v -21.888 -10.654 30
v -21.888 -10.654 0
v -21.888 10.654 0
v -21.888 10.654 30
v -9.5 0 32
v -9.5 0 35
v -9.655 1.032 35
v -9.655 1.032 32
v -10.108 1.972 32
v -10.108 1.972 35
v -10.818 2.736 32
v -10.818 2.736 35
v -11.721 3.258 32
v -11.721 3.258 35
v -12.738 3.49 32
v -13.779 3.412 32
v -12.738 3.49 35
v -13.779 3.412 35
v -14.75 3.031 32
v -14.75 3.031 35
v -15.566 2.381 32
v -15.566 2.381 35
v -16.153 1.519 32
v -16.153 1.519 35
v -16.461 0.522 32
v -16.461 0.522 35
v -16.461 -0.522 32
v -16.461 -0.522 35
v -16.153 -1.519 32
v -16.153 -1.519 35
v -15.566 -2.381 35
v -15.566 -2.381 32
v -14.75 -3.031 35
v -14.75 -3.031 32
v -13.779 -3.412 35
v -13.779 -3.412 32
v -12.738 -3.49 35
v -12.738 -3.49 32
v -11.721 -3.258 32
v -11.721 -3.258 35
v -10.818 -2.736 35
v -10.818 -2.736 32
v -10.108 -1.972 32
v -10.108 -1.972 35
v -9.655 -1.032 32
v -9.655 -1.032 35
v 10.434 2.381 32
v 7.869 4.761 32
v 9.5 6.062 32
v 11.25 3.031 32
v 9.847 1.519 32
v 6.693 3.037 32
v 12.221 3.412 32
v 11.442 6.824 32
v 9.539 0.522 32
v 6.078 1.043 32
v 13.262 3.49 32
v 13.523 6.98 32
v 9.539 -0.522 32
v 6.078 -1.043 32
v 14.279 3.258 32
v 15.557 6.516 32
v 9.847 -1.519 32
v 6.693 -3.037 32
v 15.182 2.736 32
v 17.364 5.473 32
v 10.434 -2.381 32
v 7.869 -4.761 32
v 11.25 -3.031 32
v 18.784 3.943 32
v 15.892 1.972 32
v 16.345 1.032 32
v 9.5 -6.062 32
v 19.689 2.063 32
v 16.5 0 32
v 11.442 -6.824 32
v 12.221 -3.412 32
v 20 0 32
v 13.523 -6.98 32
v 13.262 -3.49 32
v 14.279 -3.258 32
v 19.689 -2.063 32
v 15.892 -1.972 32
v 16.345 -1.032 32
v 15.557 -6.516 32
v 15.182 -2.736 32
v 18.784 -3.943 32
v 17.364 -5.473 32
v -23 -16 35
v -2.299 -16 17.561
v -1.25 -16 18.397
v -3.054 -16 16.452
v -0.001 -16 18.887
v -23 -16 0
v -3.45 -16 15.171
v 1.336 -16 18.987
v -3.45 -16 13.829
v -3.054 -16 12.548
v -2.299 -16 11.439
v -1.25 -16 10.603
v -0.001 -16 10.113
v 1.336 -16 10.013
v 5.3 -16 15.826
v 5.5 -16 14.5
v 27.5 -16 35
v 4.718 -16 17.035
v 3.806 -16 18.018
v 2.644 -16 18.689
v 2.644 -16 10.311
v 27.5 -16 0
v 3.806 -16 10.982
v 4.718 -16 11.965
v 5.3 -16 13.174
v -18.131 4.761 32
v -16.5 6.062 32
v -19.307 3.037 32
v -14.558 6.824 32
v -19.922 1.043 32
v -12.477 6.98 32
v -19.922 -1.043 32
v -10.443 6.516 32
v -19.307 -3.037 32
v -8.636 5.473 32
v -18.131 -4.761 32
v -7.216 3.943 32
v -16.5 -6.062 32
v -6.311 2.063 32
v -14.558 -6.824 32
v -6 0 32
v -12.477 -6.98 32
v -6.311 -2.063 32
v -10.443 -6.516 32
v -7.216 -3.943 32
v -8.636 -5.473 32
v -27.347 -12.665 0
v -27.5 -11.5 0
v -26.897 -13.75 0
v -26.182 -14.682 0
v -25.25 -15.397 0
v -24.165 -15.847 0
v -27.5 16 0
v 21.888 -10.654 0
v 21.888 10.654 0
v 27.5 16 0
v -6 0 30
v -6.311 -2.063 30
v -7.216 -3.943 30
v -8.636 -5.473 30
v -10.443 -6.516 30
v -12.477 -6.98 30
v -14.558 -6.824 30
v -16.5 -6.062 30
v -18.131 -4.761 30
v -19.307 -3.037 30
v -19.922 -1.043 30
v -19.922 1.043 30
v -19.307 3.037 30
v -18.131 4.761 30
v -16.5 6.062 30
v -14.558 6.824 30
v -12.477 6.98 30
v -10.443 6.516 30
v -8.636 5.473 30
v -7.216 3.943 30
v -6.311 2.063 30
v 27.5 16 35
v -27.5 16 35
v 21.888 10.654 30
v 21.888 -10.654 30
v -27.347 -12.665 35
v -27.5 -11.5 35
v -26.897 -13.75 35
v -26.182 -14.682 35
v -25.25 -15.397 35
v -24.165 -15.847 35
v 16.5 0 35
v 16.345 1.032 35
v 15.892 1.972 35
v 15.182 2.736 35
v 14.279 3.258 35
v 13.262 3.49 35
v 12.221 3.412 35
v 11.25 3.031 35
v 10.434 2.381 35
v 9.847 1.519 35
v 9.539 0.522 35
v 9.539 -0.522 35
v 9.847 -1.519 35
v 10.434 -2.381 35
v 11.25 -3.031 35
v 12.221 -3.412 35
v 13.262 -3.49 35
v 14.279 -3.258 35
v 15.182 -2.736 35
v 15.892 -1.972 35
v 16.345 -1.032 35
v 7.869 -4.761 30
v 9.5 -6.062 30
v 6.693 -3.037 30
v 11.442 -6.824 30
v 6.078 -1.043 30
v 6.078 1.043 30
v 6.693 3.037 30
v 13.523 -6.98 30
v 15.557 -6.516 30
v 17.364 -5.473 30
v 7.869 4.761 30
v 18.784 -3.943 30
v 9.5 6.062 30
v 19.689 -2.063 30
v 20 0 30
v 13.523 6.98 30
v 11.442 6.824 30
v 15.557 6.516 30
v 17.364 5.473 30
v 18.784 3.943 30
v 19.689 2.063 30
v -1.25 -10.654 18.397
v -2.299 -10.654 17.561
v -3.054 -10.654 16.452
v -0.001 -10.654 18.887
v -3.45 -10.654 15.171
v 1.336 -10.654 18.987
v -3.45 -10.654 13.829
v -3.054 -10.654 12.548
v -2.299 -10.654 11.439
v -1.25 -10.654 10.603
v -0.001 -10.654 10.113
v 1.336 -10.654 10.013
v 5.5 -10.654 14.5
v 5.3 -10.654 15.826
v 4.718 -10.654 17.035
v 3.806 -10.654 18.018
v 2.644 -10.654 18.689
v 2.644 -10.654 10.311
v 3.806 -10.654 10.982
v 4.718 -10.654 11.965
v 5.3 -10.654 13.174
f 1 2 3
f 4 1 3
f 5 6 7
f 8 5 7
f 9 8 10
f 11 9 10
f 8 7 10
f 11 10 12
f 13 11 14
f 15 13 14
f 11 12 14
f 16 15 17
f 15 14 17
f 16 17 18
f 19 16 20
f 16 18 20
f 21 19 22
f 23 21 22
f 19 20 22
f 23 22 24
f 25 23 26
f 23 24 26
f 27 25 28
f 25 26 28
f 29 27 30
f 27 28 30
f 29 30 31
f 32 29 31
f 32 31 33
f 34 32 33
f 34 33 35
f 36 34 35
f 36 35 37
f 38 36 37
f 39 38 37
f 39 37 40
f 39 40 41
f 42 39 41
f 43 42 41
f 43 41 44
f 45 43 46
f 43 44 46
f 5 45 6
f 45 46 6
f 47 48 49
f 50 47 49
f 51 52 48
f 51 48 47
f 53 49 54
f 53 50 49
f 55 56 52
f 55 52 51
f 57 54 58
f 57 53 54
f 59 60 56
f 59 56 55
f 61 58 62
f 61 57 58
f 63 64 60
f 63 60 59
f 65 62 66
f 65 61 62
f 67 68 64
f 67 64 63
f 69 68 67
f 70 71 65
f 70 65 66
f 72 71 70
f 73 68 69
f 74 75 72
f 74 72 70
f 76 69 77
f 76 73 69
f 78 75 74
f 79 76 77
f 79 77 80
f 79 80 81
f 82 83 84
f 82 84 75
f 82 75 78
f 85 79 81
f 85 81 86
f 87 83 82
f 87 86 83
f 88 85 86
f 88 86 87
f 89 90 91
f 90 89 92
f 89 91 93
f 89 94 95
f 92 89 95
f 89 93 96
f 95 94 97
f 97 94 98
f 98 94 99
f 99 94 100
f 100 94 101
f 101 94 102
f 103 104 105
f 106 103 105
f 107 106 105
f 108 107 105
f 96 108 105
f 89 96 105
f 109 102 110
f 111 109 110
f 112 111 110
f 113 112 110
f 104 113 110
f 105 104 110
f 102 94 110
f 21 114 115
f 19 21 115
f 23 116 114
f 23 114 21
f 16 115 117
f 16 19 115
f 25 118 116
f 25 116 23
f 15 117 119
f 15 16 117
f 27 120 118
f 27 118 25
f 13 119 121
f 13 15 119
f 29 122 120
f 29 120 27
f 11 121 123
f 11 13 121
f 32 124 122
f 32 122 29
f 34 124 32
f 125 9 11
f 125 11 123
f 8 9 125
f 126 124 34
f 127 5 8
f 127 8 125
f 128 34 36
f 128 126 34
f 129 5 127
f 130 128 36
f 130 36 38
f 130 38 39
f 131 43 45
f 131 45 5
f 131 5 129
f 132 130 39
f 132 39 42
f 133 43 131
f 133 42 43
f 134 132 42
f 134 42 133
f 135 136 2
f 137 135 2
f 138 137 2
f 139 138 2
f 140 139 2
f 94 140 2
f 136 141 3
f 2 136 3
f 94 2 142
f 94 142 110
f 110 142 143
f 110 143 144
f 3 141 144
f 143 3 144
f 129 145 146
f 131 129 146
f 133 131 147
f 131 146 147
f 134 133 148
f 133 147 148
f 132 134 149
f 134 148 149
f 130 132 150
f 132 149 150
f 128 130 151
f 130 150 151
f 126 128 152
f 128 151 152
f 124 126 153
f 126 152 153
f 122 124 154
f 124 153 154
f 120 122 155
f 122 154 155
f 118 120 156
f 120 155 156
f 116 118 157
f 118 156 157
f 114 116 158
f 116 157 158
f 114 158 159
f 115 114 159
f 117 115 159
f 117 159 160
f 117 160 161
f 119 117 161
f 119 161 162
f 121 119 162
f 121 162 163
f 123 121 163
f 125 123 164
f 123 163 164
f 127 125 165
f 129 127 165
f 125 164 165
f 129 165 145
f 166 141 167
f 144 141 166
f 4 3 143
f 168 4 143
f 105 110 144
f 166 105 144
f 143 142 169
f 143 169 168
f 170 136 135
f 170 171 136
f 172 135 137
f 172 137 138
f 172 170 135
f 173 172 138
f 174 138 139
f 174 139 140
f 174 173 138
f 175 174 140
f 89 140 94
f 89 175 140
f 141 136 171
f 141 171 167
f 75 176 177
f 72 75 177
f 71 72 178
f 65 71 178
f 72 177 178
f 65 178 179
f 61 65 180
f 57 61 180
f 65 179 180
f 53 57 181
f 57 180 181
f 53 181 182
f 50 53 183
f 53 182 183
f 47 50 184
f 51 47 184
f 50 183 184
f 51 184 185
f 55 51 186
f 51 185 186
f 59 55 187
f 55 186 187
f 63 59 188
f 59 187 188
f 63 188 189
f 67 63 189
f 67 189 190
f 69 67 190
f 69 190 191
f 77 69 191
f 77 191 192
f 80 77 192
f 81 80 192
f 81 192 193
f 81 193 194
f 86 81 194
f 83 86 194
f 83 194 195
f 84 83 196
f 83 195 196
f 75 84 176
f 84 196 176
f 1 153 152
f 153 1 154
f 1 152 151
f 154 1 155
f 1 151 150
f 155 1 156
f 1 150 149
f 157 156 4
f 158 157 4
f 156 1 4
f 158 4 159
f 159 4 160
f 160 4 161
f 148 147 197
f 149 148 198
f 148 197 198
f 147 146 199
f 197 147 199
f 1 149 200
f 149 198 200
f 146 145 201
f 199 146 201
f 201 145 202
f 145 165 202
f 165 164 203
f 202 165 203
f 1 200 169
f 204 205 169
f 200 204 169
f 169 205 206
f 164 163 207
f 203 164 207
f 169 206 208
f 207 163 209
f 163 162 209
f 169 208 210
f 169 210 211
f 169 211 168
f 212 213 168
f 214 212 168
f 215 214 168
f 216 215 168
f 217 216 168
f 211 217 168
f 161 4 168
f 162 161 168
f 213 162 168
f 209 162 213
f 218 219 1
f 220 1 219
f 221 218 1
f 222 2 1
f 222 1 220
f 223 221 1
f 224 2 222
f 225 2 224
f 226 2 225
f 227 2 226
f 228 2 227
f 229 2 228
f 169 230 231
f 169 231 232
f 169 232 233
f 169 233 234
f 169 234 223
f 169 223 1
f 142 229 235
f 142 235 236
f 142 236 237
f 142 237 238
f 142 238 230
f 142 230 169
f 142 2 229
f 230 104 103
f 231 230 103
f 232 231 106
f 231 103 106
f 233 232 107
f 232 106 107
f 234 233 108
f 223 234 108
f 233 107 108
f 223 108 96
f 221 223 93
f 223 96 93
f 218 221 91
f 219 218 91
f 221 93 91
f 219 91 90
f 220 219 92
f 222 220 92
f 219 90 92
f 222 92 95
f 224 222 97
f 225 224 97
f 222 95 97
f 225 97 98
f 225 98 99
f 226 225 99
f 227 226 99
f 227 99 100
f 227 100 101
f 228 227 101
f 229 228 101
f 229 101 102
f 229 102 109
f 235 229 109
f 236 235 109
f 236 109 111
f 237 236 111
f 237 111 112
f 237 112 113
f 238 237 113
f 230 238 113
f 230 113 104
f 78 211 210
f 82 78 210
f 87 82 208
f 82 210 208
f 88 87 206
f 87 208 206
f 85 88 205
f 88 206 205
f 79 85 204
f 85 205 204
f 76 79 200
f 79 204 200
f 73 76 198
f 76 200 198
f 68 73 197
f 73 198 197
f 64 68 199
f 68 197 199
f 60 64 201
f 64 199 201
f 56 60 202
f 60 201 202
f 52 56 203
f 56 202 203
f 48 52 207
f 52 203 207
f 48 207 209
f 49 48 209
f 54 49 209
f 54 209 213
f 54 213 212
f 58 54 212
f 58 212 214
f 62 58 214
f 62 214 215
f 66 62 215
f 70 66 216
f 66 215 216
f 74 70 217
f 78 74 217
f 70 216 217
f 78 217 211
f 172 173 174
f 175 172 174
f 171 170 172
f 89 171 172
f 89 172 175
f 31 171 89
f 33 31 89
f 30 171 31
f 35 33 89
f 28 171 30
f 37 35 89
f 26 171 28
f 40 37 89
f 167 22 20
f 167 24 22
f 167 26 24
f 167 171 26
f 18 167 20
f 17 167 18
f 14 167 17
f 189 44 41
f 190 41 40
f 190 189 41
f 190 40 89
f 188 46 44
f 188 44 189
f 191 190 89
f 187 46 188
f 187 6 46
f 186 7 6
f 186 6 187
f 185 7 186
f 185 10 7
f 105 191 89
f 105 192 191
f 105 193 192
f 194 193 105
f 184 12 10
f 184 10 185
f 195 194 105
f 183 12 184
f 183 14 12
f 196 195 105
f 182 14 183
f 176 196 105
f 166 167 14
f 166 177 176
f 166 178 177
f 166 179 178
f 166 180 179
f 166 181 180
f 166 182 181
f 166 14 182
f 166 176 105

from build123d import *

# Parameters (mm, degrees)
F0_W      = 55
F0_H      = 32
F1_DEPTH  = 35
F2_W      = 43.775738
F2_H      = 21.308826
F3_DEPTH  = 30
F4_R      = 4.5
F5_R      = 4.5
F6_DEPTH  = 10
F7_R      = 3.5
F8_DEPTH  = 3
F9_R      = 7
F10_DEPTH = 2


with BuildPart() as f1:
    # F0 (on Top) → F1 (new body)
    with BuildSketch(Plane.XY):
        Rectangle(F0_W, F0_H)
    extrude(amount=F1_DEPTH)

    # F2 (on Top) → F3 (cut)
    with BuildSketch(Plane.XY):
        Rectangle(F2_W, F2_H)
    extrude(amount=F3_DEPTH, mode=Mode.SUBTRACT)

    # F4
    f4_edges = [f1.edges().sort_by_distance(p)[0] for p in [
        (-27.5, -16, 17.5),
    ]]
    fillet(f4_edges, radius=F4_R)

    # F5 (on face) → F6 (cut)
    with BuildSketch(Plane.XZ.offset(16)):
        with Locations((1, 14.5)):
            Circle(F5_R)
    extrude(amount=-F6_DEPTH, mode=Mode.SUBTRACT)

    # F7 (on face) → F8 (cut)
    with BuildSketch(Plane.XY.offset(35)):
        with Locations((-13, 0)):
            Circle(F7_R)
        with Locations((13, 0)):
            Circle(F7_R)
    extrude(amount=-F8_DEPTH, mode=Mode.SUBTRACT)

    # F9 (on face) → F10 (cut)
    with BuildSketch(Plane(origin=(0, 0, 30), x_dir=(1, 0, 0), z_dir=(0, 0, -1))):
        with Locations((-13, 0)):
            Circle(F9_R)
        with Locations((13, 0)):
            Circle(F9_R)
    extrude(amount=-F10_DEPTH, mode=Mode.SUBTRACT)


solid = f1.part
